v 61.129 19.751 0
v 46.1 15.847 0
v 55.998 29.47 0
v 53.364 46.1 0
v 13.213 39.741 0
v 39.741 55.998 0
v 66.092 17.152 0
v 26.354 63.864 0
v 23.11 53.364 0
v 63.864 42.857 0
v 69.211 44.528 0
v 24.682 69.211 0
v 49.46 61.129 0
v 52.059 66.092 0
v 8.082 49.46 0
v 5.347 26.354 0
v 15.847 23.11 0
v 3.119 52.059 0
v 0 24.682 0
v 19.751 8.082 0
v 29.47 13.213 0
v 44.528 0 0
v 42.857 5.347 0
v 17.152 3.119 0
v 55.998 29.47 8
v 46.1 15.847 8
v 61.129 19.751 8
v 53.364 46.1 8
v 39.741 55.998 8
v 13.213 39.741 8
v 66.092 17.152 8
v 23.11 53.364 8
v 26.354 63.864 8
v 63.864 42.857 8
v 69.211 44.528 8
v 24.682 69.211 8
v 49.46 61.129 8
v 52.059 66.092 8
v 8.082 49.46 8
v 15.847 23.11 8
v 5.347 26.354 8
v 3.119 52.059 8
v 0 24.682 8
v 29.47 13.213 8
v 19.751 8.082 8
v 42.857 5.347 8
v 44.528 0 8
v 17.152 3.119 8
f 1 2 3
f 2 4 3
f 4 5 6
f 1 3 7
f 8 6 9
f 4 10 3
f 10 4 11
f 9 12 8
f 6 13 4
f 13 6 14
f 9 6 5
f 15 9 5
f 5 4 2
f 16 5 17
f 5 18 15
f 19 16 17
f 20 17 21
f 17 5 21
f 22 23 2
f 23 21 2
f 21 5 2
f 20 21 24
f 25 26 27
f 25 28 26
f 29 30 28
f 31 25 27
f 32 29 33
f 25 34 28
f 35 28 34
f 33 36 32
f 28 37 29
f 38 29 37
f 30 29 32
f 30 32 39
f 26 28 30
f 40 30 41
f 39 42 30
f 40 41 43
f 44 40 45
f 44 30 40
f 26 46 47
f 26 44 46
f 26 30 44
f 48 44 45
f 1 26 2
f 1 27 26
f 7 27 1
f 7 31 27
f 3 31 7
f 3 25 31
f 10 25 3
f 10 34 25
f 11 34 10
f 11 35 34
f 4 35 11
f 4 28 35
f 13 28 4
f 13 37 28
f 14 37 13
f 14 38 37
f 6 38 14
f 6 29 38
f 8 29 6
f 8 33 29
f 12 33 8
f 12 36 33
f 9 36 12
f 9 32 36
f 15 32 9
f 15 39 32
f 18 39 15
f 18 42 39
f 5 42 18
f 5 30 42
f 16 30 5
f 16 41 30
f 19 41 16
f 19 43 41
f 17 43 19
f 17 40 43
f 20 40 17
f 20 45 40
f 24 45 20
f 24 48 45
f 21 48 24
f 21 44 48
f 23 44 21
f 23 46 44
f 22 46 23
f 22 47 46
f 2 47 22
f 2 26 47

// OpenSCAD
$fn = 32;

// ----------------------------------------------------------------------
// Fan rotor section: 8 blades, 22 mm hub radius, 14 mm blades
// ----------------------------------------------------------------------

// --- parameters (mm) ---
profile_height = 8;       // extrusion height
profile_points = 24;      // points of the closed outline

profile = [[55.998, 29.47], [63.864, 42.857], [69.211, 44.528], [53.364, 46.1], [49.46, 61.129], [52.059, 66.092], [39.741, 55.998], [26.354, 63.864], [24.682, 69.211], [23.11, 53.364], [8.082, 49.46], [3.119, 52.059], [13.213, 39.741], [5.347, 26.354], [0, 24.682], [15.847, 23.11], [19.751, 8.082], [17.152, 3.119], [29.47, 13.213], [42.857, 5.347], [44.528, 0], [46.1, 15.847], [61.129, 19.751], [66.092, 17.152]];  // single closed polygon, 24 points, counter clockwise

// --- the one profile operation ---
linear_extrude(height = profile_height) polygon(points = profile);
